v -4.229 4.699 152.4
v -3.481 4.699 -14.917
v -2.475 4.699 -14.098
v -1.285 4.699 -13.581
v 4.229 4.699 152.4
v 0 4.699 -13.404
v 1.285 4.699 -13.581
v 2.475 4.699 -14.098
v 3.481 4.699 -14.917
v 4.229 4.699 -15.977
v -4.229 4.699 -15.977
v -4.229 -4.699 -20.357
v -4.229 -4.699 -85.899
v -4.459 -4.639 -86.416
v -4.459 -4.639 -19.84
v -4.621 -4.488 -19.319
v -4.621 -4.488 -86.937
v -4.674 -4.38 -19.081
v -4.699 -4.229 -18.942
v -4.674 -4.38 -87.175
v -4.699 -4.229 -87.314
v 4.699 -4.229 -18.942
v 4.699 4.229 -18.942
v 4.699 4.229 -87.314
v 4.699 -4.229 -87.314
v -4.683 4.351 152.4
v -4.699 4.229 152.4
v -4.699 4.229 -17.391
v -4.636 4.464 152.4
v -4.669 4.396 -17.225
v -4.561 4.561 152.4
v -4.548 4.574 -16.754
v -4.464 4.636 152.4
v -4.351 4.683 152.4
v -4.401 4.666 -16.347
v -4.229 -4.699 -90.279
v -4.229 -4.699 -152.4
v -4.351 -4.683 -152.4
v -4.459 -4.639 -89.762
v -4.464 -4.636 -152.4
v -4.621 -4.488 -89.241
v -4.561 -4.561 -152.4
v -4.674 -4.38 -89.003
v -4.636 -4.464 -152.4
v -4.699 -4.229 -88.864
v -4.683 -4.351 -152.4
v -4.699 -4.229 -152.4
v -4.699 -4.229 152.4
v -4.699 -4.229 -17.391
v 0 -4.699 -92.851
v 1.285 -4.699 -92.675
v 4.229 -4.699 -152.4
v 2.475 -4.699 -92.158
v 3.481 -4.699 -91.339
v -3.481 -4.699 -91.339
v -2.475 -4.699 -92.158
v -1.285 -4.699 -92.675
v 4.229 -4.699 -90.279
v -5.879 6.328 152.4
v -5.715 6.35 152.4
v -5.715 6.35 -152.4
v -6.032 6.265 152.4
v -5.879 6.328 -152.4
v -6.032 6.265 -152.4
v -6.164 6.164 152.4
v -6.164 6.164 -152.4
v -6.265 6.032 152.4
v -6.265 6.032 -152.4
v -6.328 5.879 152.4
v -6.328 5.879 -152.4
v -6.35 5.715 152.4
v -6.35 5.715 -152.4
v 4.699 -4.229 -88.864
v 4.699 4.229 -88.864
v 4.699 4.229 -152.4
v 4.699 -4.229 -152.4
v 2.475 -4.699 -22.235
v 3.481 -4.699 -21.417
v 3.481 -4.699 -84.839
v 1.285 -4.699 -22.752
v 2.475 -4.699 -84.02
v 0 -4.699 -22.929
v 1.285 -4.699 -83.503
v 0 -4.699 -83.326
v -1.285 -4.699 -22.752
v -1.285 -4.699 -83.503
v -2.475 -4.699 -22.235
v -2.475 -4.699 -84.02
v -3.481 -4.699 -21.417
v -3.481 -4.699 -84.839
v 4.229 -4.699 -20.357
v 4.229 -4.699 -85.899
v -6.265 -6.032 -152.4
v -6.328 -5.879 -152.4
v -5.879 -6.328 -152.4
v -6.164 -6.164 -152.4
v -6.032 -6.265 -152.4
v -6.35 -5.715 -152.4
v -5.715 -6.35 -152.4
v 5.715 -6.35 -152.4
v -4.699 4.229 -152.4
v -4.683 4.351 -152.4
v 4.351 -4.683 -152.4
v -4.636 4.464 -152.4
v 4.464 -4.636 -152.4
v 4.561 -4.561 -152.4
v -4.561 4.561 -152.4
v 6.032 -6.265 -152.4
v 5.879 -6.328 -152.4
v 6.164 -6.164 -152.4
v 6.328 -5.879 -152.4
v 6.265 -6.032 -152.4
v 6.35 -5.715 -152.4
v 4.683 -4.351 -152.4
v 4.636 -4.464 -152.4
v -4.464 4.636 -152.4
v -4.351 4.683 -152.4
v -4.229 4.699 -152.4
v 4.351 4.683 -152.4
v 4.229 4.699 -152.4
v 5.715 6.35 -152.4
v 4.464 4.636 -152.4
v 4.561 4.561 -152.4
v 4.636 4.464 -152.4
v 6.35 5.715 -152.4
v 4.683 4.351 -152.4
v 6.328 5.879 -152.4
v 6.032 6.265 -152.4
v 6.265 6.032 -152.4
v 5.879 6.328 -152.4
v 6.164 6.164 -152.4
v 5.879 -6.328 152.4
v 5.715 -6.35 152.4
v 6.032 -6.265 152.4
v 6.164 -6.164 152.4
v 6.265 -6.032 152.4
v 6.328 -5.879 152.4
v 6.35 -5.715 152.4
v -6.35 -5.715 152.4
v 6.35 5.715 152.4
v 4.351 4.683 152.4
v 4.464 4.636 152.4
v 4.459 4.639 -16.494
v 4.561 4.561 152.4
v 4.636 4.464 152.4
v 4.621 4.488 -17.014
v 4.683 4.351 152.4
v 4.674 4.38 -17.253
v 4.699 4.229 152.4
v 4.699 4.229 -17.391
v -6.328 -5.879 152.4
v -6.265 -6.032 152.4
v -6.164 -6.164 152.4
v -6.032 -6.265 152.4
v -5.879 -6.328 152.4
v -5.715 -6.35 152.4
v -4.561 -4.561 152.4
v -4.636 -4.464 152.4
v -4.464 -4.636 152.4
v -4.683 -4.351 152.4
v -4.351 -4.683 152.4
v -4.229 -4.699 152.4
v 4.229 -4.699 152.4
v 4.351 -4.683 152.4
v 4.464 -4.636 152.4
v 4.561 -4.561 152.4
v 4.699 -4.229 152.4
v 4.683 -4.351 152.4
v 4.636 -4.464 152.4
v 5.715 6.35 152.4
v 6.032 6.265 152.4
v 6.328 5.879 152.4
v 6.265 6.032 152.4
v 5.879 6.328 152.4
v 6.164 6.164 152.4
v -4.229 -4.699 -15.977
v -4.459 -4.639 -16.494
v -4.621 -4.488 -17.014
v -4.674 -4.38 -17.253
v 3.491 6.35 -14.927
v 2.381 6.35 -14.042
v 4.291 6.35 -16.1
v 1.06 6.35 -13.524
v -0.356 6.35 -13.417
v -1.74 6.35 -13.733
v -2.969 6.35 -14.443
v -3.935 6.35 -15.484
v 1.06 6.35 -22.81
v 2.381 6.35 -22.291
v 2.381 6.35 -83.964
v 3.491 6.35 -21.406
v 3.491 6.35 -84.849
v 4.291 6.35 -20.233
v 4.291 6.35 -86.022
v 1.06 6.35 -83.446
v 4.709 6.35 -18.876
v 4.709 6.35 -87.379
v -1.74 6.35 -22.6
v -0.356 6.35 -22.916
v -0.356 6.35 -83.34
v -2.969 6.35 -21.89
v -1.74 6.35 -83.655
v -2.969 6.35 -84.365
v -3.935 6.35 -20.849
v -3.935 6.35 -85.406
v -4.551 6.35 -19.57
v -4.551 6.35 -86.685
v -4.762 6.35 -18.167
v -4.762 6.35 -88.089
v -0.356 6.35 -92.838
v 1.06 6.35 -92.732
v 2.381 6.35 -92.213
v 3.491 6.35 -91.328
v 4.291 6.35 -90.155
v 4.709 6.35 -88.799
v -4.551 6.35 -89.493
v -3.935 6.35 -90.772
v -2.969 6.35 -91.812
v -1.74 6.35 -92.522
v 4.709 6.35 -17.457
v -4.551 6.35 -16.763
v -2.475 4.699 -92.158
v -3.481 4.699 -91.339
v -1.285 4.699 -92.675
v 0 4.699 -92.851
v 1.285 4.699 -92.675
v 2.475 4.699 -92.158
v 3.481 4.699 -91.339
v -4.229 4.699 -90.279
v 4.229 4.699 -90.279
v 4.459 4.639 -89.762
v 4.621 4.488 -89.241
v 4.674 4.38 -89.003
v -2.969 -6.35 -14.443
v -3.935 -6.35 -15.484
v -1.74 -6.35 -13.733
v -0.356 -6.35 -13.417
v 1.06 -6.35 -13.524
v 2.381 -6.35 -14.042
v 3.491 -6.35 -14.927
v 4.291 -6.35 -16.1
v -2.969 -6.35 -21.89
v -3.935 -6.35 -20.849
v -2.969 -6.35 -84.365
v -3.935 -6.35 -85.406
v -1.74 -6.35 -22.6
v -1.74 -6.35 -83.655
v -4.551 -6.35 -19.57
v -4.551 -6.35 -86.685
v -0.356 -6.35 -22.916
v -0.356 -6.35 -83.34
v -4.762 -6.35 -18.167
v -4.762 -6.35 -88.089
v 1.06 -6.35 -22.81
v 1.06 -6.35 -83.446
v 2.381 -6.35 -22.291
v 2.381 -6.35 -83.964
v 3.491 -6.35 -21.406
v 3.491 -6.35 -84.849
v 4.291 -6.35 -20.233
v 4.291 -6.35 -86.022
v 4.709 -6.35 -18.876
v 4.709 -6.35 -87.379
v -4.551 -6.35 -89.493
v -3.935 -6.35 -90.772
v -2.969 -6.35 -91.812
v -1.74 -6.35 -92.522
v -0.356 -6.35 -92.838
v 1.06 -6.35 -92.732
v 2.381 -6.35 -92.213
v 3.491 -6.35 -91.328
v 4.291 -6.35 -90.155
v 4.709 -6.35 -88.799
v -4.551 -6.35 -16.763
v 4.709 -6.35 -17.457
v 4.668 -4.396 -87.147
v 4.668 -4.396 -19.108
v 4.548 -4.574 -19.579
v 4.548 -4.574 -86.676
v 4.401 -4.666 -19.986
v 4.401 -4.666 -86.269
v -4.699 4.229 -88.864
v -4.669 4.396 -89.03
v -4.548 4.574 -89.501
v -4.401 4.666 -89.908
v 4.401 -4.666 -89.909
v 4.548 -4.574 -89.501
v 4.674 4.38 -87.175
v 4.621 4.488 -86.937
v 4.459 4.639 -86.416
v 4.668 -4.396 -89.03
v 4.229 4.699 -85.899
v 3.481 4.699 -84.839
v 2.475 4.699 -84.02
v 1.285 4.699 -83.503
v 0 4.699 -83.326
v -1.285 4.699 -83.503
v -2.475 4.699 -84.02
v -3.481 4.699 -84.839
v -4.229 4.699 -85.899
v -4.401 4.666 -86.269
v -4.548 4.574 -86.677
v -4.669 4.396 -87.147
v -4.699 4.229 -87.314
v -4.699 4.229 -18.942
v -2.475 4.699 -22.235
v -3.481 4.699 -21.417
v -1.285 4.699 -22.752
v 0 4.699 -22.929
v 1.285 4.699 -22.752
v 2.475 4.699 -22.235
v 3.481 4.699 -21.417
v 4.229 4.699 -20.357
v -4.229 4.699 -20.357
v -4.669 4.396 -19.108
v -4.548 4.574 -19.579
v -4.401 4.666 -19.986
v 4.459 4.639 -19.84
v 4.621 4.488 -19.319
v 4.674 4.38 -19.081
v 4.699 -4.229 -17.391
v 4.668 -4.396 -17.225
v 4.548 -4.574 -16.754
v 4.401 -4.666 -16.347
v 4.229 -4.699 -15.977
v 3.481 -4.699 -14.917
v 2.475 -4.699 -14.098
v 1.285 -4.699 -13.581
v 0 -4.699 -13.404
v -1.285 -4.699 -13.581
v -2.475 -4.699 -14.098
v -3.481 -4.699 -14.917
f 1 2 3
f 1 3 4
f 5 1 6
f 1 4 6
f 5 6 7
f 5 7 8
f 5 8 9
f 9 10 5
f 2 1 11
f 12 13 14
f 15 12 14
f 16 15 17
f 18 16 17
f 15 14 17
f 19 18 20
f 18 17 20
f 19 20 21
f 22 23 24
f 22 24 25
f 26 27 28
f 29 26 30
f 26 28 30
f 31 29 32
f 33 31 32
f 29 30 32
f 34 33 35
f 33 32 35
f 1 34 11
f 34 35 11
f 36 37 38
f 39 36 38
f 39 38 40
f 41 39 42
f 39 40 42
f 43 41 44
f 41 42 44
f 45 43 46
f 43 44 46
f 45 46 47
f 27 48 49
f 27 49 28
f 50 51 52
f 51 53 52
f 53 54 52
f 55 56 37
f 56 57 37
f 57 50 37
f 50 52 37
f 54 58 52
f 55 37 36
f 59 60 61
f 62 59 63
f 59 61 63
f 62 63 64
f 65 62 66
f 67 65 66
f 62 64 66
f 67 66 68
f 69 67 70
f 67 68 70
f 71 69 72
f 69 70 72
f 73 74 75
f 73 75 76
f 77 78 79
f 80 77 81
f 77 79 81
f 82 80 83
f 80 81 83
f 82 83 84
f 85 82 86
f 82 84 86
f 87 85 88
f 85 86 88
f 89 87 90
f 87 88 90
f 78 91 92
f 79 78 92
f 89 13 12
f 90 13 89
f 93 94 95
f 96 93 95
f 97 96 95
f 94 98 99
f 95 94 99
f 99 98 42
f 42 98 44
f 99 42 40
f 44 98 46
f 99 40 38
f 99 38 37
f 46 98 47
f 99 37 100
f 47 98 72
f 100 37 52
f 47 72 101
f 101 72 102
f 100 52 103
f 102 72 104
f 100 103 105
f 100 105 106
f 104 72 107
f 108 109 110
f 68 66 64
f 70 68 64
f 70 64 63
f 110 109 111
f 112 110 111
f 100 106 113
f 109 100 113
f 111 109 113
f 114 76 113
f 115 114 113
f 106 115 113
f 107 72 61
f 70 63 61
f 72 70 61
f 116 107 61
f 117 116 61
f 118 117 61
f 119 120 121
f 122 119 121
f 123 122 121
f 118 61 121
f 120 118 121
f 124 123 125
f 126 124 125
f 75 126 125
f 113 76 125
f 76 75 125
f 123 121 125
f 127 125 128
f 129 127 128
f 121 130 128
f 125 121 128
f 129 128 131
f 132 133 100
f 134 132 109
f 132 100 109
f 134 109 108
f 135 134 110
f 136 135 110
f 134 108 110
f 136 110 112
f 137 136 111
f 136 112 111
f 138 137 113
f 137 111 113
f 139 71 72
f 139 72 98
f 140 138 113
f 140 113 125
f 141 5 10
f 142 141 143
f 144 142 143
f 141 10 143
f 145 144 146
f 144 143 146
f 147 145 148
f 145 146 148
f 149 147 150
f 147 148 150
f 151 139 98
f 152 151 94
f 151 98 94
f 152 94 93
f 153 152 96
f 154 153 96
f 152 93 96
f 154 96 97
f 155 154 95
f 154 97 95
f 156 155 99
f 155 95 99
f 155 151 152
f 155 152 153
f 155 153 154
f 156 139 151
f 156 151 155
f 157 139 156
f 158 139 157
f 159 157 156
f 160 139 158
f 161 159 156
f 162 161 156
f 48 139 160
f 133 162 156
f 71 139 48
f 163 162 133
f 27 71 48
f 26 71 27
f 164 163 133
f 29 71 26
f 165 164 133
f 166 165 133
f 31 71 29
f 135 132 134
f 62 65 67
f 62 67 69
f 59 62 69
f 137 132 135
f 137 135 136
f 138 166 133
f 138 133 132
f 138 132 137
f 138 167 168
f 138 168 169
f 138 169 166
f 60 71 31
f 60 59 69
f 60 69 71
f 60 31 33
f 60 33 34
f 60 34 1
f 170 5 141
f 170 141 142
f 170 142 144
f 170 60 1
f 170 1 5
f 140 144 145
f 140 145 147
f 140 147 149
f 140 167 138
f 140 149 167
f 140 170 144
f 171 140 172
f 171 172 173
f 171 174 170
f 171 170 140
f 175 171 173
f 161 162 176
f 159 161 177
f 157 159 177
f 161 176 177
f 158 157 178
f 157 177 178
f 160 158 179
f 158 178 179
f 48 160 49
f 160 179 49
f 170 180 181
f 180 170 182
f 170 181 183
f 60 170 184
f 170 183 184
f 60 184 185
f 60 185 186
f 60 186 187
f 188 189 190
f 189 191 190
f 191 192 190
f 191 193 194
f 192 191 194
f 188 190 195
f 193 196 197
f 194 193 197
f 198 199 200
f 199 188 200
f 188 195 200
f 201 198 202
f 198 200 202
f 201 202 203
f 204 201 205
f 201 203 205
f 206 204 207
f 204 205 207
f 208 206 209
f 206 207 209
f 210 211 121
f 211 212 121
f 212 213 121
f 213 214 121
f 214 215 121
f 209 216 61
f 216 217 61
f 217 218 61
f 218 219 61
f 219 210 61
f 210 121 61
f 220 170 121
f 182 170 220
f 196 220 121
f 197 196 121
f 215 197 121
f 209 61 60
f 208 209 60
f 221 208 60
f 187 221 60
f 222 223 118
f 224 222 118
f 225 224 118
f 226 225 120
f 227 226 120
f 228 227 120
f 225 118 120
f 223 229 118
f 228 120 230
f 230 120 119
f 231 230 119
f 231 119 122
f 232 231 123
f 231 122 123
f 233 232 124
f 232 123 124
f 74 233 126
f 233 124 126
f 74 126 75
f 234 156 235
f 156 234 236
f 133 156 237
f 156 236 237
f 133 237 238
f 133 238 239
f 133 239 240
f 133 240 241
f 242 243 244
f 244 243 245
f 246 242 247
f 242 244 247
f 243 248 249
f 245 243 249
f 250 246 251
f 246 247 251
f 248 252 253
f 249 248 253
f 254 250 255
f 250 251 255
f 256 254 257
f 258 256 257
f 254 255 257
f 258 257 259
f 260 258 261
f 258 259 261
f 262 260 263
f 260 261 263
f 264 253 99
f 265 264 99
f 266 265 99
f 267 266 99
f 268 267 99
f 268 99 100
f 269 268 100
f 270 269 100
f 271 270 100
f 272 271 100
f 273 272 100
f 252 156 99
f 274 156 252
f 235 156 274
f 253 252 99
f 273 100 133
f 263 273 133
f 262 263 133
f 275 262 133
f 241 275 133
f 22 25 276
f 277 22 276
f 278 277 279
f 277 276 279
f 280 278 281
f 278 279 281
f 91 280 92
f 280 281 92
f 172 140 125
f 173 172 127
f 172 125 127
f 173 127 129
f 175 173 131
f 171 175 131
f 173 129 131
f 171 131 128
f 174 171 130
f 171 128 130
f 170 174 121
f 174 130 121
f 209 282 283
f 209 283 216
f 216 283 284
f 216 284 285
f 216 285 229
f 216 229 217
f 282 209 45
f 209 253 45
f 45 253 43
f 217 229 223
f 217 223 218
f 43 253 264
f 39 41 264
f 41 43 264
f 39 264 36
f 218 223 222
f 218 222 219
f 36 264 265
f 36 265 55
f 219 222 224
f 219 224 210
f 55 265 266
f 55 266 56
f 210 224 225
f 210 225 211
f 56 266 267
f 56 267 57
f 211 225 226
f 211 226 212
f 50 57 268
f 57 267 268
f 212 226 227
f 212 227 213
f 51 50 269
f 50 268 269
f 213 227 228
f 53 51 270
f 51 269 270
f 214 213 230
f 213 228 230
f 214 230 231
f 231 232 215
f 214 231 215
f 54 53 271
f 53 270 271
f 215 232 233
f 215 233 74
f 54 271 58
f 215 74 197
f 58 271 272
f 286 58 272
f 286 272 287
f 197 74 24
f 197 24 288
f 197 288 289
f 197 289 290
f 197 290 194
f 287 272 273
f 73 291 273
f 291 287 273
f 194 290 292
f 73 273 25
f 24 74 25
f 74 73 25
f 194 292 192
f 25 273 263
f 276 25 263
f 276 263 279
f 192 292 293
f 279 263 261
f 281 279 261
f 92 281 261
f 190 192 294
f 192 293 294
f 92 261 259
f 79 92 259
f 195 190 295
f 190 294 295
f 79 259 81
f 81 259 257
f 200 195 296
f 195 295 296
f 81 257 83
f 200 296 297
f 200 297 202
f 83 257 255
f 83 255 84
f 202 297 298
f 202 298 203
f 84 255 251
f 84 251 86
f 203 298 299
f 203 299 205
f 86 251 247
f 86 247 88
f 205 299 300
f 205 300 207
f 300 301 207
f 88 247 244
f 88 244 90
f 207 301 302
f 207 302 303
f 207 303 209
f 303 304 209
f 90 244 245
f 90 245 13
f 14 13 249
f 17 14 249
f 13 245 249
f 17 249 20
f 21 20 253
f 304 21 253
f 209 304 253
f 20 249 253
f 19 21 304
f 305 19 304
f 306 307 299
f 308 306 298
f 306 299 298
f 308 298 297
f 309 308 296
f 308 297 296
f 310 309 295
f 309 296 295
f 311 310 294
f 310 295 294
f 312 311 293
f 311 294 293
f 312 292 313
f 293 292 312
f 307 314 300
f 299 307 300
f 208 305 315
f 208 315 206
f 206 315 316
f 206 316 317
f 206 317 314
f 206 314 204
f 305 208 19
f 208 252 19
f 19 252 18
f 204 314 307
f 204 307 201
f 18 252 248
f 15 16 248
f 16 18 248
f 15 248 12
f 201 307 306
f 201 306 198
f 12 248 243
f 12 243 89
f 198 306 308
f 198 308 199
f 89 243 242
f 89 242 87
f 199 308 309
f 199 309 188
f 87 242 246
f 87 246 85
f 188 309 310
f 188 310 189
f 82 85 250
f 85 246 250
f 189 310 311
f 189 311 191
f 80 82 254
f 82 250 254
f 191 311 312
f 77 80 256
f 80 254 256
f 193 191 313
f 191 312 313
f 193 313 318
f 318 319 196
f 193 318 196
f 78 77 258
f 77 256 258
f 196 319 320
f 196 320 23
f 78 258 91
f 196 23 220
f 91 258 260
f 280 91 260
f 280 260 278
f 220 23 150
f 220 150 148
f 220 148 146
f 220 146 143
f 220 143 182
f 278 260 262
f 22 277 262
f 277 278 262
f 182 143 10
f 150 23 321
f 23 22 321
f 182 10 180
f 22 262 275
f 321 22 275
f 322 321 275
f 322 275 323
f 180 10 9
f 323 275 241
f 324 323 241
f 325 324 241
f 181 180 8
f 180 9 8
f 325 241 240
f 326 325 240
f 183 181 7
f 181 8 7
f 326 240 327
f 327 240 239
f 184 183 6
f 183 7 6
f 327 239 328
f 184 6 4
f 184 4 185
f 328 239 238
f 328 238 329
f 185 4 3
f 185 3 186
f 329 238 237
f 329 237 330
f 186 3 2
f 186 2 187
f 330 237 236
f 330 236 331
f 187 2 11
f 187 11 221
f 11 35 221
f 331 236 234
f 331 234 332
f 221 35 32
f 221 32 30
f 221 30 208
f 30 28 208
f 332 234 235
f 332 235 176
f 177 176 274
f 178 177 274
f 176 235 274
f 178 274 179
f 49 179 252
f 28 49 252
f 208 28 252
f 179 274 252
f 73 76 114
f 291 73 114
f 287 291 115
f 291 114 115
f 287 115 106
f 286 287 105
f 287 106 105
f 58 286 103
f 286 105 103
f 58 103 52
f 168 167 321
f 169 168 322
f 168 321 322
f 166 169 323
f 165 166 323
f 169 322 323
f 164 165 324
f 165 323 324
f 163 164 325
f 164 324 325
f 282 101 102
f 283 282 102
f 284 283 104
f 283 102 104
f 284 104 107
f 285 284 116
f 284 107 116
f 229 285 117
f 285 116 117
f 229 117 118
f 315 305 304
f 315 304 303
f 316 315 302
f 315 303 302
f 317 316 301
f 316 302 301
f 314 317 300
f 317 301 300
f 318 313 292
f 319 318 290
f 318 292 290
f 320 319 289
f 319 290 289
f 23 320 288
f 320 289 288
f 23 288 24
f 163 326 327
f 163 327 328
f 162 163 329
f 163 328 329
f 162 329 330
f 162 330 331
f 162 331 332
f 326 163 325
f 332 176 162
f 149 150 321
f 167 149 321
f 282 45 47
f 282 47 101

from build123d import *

# Parameters (mm, degrees)
BOSS_EXTRUDE1_DEPTH          = 152.4
BOSS_EXTRUDE1_DEPTH_BACK     = 152.4
F_3_8_0_375_DIAMETER_HOLE1_D = 9.525
F_3_8_0_375_DIAMETER_HOLE2_D = 9.525


with BuildPart() as part:
    # Sketch4 → Boss-Extrude1 (new, two sides: drawn at the far end of the back side and taken through both)
    with BuildSketch(Plane.XY.offset(-BOSS_EXTRUDE1_DEPTH_BACK)):
        with BuildLine():
            Line((6.35, -5.715), (6.35, 5.715))
            ThreePointArc((6.35, 5.715), (6.164012806, 6.164012806), (5.715, 6.35))
            Line((5.715, 6.35), (-5.715, 6.35))
            ThreePointArc((-5.715, 6.35), (-6.164012806, 6.164012806), (-6.35, 5.715))
            Line((-6.35, 5.715), (-6.35, -5.715))
            ThreePointArc((-6.35, -5.715), (-6.164012806, -6.164012806), (-5.715, -6.35))
            Line((-5.715, -6.35), (5.715, -6.35))
            ThreePointArc((5.715, -6.35), (6.164012806, -6.164012806), (6.35, -5.715))
        make_face()
        with BuildLine():
            Line((4.699, 4.2291), (4.699, -4.2291))
            ThreePointArc((4.699, -4.2291), (4.561369476, -4.561369476), (4.2291, -4.699))
            Line((4.2291, -4.699), (-4.2291, -4.699))
            ThreePointArc((-4.2291, -4.699), (-4.561369476, -4.561369476), (-4.699, -4.2291))
            Line((-4.699, -4.2291), (-4.699, 4.2291))
            ThreePointArc((-4.699, 4.2291), (-4.561369476, 4.561369476), (-4.2291, 4.699))
            Line((-4.2291, 4.699), (4.2291, 4.699))
            ThreePointArc((4.2291, 4.699), (4.561369476, 4.561369476), (4.699, 4.2291))
        make_face(mode=Mode.SUBTRACT)
    extrude(amount=BOSS_EXTRUDE1_DEPTH + BOSS_EXTRUDE1_DEPTH_BACK)

    # 3/8 (0.375) Diameter Hole1 (through all)
    with Locations(Plane(origin=(0, 6.35, 0), x_dir=(1, 0, 0), z_dir=(0, 1, 0))):
        with Locations((0, 88.088749974)):
            Hole(F_3_8_0_375_DIAMETER_HOLE1_D / 2)

    # 3/8 (0.375) Diameter Hole2 (through all)
    with Locations(Plane(origin=(0, 6.35, 0), x_dir=(1, 0, 0), z_dir=(0, 1, 0))):
        with Locations((0, 18.166595951)):
            Hole(F_3_8_0_375_DIAMETER_HOLE2_D / 2)


solid = part.part
